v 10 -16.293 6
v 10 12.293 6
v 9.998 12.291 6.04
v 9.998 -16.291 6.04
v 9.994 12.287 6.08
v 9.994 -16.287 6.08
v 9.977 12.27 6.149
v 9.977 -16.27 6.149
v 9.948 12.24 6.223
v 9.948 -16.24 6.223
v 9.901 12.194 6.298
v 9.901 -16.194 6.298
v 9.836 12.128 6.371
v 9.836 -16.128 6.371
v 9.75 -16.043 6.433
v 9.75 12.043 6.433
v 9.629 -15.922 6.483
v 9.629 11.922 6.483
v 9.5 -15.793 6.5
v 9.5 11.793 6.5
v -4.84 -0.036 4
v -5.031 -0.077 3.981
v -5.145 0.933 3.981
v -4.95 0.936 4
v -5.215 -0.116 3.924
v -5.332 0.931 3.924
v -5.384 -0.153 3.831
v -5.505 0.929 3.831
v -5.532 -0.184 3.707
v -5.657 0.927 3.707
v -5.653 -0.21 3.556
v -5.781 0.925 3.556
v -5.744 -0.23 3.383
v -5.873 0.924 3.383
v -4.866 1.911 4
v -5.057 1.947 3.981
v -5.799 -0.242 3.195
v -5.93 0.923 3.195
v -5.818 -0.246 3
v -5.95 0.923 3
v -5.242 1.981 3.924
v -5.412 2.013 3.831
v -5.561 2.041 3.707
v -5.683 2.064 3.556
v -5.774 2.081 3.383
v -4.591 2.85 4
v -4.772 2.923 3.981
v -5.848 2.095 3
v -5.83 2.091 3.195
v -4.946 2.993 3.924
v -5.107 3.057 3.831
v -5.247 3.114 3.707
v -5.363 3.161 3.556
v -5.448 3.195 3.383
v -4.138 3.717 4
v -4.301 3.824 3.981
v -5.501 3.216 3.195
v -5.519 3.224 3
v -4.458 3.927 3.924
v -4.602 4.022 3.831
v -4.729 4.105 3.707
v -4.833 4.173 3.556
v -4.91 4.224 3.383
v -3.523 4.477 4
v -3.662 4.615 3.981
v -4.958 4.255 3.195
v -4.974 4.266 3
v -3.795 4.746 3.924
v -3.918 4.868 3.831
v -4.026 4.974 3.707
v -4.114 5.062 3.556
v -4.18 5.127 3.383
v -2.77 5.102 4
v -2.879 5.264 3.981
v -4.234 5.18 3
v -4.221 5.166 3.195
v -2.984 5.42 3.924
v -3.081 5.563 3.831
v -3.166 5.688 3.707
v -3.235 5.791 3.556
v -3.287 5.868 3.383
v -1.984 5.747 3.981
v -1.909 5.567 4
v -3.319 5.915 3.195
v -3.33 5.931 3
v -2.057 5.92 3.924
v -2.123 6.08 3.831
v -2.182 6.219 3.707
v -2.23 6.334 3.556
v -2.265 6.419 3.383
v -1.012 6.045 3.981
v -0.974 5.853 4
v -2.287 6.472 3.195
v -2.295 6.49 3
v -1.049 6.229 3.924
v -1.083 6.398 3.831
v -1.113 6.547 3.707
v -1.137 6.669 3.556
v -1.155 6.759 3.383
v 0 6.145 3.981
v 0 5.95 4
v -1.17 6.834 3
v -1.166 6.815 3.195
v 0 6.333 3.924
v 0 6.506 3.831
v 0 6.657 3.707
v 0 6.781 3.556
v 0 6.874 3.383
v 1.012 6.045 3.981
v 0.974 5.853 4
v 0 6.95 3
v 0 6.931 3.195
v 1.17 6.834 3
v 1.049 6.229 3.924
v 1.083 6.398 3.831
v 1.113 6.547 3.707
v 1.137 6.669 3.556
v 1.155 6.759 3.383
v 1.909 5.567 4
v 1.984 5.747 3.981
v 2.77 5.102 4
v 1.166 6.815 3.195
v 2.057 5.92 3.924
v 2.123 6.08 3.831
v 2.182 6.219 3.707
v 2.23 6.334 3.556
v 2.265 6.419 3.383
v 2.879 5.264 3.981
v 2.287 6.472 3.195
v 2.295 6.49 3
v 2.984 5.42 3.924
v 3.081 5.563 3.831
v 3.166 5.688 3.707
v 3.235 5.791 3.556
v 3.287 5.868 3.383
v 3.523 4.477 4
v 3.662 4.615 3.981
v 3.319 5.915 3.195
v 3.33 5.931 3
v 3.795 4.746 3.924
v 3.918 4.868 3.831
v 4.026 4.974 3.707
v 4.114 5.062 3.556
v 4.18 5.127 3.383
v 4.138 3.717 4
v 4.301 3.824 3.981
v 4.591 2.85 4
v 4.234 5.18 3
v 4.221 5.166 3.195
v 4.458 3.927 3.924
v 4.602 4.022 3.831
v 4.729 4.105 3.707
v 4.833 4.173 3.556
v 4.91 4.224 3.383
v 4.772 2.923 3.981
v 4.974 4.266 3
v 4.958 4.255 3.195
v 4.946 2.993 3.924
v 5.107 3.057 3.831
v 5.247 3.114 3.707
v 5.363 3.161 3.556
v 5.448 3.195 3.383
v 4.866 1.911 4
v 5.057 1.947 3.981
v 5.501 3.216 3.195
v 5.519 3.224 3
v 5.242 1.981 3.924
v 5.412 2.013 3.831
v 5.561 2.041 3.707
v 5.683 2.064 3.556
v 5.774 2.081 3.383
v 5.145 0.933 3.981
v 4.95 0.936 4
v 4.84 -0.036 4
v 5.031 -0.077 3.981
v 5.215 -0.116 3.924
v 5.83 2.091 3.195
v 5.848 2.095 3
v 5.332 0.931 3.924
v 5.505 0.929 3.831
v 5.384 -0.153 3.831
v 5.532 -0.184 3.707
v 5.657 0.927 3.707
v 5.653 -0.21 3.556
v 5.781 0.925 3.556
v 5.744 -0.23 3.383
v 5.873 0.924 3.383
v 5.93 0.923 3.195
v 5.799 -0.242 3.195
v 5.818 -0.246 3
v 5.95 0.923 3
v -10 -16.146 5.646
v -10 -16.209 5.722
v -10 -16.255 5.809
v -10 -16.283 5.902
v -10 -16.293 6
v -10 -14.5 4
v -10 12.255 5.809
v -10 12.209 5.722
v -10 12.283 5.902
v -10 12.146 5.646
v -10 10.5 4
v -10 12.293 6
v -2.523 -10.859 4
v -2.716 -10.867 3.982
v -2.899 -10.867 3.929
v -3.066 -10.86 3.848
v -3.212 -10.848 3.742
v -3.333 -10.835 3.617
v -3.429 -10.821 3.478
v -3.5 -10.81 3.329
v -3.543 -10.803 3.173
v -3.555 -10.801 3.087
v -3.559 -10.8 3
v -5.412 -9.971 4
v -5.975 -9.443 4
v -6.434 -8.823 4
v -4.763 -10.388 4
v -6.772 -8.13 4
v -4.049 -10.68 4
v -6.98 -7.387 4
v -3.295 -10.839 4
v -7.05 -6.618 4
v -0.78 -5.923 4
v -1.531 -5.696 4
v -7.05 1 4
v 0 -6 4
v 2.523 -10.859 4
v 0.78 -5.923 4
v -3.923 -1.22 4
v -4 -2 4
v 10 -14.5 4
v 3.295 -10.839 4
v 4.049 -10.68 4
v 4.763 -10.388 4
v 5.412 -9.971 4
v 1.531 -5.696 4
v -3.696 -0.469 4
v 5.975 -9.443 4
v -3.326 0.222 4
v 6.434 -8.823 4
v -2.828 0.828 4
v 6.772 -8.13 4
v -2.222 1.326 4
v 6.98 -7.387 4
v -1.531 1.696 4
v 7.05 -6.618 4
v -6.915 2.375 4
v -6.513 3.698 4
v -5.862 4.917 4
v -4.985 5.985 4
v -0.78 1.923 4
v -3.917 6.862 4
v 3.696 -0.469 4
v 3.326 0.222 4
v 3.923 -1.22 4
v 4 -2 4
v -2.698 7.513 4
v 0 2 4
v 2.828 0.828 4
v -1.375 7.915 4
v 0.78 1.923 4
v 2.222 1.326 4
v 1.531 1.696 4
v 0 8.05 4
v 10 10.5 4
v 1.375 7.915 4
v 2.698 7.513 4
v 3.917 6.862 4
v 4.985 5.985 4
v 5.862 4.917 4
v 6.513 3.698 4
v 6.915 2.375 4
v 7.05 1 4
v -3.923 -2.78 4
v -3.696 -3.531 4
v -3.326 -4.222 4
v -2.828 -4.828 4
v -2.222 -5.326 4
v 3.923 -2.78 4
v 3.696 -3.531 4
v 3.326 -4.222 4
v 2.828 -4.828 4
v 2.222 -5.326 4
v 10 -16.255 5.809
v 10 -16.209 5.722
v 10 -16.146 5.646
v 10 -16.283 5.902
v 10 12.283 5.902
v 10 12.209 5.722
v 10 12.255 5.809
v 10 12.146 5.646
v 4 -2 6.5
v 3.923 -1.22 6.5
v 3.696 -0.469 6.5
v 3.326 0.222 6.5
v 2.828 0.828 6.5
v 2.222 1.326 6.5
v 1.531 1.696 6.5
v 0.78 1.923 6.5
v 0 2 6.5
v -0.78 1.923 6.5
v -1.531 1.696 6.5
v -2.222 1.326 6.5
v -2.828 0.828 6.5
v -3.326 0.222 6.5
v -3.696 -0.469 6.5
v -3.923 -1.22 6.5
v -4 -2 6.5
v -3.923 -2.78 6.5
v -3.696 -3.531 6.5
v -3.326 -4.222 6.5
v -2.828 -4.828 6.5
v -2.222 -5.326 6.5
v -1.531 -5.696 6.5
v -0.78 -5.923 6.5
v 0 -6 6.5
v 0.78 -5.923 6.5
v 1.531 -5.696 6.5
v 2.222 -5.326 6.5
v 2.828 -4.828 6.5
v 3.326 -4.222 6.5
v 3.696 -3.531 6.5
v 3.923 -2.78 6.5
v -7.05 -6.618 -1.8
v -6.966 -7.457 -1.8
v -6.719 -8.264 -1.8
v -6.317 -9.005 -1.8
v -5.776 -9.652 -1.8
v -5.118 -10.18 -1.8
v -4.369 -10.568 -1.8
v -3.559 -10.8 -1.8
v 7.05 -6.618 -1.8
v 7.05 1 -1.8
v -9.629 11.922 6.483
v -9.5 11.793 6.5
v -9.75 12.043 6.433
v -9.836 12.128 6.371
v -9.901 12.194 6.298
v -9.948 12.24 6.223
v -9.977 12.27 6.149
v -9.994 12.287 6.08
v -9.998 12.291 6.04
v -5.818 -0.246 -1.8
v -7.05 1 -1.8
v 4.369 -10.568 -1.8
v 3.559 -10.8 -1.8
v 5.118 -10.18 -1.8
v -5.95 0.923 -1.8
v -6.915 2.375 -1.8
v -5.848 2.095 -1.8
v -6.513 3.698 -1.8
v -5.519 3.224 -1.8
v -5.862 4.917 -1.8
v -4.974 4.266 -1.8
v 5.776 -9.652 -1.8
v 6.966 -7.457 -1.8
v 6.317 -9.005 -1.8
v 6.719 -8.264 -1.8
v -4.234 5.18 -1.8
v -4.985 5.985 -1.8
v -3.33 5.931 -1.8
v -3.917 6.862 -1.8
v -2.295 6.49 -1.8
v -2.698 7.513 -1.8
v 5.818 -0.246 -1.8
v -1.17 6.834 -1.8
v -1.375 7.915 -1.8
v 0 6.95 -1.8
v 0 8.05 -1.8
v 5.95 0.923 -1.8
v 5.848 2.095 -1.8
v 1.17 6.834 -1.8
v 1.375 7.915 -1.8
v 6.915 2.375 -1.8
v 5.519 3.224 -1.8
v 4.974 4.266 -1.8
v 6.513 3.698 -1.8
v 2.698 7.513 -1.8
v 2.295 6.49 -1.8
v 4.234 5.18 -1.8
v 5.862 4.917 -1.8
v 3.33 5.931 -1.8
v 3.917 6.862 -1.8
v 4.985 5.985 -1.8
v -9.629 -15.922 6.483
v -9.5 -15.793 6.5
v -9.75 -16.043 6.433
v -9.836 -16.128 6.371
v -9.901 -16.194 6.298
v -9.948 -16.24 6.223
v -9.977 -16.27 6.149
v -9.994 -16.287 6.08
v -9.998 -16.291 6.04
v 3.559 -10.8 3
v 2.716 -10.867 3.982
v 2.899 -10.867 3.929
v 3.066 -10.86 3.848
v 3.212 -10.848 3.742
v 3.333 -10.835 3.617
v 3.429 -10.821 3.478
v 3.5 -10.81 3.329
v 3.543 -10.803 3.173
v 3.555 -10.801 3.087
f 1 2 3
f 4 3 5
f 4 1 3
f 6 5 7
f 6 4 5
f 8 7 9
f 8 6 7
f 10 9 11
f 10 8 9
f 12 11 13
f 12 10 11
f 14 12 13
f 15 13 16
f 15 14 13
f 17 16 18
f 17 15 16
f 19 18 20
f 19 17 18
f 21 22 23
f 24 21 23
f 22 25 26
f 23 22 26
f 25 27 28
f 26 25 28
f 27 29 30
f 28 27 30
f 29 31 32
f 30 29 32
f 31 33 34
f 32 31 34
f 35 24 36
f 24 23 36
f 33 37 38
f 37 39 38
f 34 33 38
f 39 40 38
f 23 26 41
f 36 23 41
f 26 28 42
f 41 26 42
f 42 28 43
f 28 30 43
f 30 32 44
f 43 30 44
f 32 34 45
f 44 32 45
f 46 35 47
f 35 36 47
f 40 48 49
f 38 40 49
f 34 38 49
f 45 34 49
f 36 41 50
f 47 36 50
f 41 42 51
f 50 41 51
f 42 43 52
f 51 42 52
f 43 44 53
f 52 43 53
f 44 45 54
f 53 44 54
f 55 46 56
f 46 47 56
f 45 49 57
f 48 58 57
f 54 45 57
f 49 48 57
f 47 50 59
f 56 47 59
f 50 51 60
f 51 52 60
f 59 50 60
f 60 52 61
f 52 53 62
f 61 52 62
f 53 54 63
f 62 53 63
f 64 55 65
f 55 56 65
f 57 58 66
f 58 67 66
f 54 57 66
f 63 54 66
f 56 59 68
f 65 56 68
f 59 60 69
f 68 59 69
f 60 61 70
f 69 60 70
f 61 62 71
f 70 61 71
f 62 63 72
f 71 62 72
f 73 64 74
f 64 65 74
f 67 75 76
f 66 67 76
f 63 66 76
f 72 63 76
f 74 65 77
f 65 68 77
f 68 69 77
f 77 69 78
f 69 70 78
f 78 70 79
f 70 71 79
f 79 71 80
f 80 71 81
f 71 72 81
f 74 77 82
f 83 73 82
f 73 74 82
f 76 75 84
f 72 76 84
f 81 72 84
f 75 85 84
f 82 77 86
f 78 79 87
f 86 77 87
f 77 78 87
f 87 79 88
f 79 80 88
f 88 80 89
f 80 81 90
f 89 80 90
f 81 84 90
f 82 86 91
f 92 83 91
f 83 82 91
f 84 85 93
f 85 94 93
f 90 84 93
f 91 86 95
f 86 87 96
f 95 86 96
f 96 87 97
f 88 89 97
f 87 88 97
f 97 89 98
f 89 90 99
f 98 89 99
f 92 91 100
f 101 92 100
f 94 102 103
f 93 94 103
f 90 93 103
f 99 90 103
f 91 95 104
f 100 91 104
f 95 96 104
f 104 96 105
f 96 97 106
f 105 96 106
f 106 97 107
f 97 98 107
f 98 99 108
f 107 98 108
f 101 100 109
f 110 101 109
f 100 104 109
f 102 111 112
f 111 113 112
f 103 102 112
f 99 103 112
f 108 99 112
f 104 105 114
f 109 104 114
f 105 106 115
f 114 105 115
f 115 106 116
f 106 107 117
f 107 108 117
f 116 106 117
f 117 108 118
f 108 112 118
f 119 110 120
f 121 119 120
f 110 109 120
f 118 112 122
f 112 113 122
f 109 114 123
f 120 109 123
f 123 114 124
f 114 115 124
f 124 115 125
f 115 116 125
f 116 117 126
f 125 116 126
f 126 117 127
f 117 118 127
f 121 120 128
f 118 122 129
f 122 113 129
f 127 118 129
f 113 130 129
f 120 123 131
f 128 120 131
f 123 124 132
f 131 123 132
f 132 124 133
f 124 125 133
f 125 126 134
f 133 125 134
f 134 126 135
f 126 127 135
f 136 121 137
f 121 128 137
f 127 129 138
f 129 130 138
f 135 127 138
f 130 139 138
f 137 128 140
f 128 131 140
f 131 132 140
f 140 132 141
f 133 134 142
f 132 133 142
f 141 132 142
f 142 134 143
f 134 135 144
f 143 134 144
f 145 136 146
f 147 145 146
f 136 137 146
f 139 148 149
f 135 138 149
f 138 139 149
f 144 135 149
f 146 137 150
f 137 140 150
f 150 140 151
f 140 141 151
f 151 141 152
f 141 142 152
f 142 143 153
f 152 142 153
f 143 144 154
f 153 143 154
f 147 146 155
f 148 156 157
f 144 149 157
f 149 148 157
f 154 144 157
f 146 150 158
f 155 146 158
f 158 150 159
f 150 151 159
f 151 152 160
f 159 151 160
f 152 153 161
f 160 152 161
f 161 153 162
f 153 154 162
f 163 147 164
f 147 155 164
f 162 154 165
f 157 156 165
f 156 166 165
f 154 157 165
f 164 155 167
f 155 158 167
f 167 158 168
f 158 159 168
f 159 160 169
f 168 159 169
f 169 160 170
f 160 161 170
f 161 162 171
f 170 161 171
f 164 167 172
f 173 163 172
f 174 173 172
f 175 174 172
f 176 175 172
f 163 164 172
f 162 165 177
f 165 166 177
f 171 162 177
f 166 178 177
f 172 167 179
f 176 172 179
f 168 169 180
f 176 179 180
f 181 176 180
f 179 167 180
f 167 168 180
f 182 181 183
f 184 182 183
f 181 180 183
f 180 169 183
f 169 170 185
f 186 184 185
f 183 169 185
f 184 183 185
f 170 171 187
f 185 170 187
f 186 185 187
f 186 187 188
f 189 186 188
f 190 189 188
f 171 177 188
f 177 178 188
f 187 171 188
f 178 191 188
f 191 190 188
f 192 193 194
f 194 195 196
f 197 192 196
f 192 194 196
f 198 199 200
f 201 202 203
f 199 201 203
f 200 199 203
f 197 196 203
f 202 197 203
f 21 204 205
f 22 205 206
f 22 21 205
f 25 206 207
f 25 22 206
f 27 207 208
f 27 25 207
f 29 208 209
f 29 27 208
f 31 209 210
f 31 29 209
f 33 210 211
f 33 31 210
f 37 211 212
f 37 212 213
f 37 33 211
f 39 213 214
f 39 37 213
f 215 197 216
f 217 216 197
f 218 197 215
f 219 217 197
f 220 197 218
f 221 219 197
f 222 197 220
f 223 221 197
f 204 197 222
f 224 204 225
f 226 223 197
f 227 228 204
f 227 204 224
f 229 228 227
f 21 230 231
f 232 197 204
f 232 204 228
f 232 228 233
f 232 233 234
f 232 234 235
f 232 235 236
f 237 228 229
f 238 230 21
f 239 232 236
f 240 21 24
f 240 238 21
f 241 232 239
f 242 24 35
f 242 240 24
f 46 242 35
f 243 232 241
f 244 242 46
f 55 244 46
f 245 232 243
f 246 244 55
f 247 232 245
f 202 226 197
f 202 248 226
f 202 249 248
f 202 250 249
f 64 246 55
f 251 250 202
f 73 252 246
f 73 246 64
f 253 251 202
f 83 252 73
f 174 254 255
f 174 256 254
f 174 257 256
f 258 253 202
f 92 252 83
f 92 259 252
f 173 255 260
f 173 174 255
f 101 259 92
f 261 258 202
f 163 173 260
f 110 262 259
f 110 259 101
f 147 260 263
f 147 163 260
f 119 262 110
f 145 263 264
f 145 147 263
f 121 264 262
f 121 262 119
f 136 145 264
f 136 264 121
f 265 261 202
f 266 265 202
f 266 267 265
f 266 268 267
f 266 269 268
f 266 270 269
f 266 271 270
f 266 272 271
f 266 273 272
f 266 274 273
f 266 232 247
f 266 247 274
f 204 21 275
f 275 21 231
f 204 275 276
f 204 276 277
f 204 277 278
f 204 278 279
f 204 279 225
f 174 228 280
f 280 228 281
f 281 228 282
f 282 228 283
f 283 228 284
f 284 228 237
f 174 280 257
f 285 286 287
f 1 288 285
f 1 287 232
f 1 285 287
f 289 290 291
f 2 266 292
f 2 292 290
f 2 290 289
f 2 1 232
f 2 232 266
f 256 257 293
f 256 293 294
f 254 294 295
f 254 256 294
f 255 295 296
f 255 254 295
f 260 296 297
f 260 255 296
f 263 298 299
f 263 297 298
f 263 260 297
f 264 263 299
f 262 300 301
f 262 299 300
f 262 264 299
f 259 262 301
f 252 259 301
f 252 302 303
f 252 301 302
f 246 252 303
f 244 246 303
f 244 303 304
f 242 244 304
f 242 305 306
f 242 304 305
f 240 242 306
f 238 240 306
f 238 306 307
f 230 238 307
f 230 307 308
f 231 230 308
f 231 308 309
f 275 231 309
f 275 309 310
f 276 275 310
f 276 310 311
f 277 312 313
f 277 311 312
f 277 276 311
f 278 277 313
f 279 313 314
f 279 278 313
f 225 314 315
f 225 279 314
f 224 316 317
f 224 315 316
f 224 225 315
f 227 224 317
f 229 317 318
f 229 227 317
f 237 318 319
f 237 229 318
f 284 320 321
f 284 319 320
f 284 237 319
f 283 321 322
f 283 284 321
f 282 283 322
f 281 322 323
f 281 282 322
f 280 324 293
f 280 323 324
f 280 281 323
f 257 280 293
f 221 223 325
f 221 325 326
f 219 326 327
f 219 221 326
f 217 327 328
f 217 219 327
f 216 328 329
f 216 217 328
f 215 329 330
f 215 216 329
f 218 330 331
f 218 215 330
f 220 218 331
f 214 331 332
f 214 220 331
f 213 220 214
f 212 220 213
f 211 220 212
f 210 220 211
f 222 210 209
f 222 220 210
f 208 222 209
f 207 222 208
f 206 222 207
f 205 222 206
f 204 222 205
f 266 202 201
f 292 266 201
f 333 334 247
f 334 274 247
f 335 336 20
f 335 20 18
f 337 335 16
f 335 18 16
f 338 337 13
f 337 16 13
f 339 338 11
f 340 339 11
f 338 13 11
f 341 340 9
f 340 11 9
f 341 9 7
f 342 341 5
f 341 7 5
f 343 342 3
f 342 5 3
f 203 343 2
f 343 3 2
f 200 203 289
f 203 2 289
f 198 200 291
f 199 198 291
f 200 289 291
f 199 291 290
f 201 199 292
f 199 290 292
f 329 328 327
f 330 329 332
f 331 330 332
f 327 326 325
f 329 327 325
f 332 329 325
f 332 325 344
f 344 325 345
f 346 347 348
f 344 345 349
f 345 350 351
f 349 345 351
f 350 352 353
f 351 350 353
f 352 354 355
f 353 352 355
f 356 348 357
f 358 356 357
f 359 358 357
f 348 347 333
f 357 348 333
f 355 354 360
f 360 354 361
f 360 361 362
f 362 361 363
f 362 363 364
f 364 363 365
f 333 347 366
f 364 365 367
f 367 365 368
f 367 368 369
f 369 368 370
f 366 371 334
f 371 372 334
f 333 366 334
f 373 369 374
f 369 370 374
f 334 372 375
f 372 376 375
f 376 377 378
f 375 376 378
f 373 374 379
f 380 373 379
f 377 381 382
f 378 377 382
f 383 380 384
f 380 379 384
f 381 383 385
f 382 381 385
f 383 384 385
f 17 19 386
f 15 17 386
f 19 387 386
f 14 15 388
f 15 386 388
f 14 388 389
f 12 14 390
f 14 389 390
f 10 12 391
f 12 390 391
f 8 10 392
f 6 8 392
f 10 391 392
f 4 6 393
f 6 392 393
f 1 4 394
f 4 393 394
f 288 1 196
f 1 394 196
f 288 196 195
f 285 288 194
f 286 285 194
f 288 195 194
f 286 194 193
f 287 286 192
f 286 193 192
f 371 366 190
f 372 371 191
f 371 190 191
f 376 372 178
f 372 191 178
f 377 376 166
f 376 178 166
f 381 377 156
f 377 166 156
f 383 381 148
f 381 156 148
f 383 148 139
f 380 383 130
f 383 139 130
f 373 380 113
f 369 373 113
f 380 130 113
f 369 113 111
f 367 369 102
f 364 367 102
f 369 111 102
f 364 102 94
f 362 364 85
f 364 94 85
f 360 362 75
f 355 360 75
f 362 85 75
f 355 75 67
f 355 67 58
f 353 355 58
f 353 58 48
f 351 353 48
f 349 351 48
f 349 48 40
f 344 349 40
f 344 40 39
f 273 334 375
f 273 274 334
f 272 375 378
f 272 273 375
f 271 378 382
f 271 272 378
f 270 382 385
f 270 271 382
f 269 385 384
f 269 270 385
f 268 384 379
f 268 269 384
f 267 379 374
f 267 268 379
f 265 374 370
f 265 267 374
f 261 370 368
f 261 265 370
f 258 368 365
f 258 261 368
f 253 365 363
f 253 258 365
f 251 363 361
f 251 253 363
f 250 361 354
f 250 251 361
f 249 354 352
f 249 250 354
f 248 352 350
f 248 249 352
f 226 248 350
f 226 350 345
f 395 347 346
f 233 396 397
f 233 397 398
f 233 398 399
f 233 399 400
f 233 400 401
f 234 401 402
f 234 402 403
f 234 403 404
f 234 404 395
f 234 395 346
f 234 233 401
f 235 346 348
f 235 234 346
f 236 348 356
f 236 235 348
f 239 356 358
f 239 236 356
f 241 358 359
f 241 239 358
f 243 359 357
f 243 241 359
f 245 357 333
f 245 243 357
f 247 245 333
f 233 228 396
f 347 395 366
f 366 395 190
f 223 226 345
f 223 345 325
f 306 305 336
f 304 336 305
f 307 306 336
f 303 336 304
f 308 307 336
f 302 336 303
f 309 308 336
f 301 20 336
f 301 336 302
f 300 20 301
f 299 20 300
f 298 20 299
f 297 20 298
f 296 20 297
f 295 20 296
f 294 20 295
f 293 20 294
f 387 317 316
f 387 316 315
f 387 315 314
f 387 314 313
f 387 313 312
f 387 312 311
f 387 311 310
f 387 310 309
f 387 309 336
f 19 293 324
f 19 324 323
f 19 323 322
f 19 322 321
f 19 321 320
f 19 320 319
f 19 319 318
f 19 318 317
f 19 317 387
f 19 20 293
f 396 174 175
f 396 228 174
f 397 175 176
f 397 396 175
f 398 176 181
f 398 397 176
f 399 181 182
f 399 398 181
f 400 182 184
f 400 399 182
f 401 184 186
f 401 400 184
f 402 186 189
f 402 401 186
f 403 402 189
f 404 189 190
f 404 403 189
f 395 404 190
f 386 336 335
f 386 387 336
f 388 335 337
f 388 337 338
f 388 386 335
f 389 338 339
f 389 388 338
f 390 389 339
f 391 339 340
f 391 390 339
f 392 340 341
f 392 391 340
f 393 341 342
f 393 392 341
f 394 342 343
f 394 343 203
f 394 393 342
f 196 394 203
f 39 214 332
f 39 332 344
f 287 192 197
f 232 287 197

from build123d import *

# Parameters (mm, degrees)
PAD032_DEPTH         = 10
PAD033_DEPTH         = 2.5
PAD033_DEPTH_BACK    = 4.3
FILLET011_R          = 0.5
FILLET012_R          = 1
SKETCH084_R          = 4
POCKET025_DEPTH      = 4.3010001
POCKET025_DEPTH_BACK = 4.001


with BuildPart() as part:
    # Sketch070 → Pad032 (new body, symmetric)
    with BuildSketch(Plane.YZ):
        Polygon((-12.5, 1.5), (12.5, 1.5), (15, 4), (-15, 4), align=None)
    extrude(amount=PAD032_DEPTH, both=True)

    # Sketch071 → Pad033 (join, two sides)
    with BuildSketch(Plane(origin=(0, 3, 0), x_dir=(1, 0, 0), z_dir=(0, 0, 1))) as pad033_sk:
        with BuildLine():
            ThreePointArc((7.05, 0), (0, 7.05), (-7.05, 0))
            Line((-7.05, 0), (-7.05, -7.61826472))
            ThreePointArc((-7.05, -7.61826472), (-6.0624282805, -10.3420602319), (-3.5586767903, -11.8))
            Line((-3.5586767903, -11.8), (-5.8181698251, -1.2455520409))
            ThreePointArc((5.8181698251, -1.2455520409), (0, 5.95), (-5.8181698251, -1.2455520409))
            Line((3.5586767903, -11.8), (5.8181698251, -1.2455520409))
            ThreePointArc((3.5586767903, -11.8), (6.0624283063, -10.342060201), (7.05, -7.6182646394))
            Line((7.05, 0), (7.05, -7.6182646394))
        make_face()
    extrude(amount=PAD033_DEPTH)
    extrude(pad033_sk.sketch, amount=-PAD033_DEPTH_BACK)

    # Fillet011
    fillet011_edges = [part.edges().sort_by_distance(p)[0] for p in [
        (0, 15, 4),
        (0, -15, 4),
        (-10, 0, 4),
        (10, 0, 4),
    ]]
    fillet(fillet011_edges, radius=FILLET011_R)

    # Fillet012
    fillet012_edges = [part.edges().sort_by_distance(p)[0] for p in [
        (0, 8.95, 1.5),
    ]]
    fillet(fillet012_edges, radius=FILLET012_R)

    # Sketch084 → Pocket025 (cut, two sides)
    with BuildSketch(Plane.XY) as pocket025_sk:
        Circle(SKETCH084_R)
    extrude(amount=-POCKET025_DEPTH, mode=Mode.SUBTRACT)
    extrude(pocket025_sk.sketch, amount=POCKET025_DEPTH_BACK, mode=Mode.SUBTRACT)


with BuildPart() as part_1:
    # Body023 placement: moved
    add(part.part.moved(Location((0, -2, 2.5))))


solid = part_1.part
